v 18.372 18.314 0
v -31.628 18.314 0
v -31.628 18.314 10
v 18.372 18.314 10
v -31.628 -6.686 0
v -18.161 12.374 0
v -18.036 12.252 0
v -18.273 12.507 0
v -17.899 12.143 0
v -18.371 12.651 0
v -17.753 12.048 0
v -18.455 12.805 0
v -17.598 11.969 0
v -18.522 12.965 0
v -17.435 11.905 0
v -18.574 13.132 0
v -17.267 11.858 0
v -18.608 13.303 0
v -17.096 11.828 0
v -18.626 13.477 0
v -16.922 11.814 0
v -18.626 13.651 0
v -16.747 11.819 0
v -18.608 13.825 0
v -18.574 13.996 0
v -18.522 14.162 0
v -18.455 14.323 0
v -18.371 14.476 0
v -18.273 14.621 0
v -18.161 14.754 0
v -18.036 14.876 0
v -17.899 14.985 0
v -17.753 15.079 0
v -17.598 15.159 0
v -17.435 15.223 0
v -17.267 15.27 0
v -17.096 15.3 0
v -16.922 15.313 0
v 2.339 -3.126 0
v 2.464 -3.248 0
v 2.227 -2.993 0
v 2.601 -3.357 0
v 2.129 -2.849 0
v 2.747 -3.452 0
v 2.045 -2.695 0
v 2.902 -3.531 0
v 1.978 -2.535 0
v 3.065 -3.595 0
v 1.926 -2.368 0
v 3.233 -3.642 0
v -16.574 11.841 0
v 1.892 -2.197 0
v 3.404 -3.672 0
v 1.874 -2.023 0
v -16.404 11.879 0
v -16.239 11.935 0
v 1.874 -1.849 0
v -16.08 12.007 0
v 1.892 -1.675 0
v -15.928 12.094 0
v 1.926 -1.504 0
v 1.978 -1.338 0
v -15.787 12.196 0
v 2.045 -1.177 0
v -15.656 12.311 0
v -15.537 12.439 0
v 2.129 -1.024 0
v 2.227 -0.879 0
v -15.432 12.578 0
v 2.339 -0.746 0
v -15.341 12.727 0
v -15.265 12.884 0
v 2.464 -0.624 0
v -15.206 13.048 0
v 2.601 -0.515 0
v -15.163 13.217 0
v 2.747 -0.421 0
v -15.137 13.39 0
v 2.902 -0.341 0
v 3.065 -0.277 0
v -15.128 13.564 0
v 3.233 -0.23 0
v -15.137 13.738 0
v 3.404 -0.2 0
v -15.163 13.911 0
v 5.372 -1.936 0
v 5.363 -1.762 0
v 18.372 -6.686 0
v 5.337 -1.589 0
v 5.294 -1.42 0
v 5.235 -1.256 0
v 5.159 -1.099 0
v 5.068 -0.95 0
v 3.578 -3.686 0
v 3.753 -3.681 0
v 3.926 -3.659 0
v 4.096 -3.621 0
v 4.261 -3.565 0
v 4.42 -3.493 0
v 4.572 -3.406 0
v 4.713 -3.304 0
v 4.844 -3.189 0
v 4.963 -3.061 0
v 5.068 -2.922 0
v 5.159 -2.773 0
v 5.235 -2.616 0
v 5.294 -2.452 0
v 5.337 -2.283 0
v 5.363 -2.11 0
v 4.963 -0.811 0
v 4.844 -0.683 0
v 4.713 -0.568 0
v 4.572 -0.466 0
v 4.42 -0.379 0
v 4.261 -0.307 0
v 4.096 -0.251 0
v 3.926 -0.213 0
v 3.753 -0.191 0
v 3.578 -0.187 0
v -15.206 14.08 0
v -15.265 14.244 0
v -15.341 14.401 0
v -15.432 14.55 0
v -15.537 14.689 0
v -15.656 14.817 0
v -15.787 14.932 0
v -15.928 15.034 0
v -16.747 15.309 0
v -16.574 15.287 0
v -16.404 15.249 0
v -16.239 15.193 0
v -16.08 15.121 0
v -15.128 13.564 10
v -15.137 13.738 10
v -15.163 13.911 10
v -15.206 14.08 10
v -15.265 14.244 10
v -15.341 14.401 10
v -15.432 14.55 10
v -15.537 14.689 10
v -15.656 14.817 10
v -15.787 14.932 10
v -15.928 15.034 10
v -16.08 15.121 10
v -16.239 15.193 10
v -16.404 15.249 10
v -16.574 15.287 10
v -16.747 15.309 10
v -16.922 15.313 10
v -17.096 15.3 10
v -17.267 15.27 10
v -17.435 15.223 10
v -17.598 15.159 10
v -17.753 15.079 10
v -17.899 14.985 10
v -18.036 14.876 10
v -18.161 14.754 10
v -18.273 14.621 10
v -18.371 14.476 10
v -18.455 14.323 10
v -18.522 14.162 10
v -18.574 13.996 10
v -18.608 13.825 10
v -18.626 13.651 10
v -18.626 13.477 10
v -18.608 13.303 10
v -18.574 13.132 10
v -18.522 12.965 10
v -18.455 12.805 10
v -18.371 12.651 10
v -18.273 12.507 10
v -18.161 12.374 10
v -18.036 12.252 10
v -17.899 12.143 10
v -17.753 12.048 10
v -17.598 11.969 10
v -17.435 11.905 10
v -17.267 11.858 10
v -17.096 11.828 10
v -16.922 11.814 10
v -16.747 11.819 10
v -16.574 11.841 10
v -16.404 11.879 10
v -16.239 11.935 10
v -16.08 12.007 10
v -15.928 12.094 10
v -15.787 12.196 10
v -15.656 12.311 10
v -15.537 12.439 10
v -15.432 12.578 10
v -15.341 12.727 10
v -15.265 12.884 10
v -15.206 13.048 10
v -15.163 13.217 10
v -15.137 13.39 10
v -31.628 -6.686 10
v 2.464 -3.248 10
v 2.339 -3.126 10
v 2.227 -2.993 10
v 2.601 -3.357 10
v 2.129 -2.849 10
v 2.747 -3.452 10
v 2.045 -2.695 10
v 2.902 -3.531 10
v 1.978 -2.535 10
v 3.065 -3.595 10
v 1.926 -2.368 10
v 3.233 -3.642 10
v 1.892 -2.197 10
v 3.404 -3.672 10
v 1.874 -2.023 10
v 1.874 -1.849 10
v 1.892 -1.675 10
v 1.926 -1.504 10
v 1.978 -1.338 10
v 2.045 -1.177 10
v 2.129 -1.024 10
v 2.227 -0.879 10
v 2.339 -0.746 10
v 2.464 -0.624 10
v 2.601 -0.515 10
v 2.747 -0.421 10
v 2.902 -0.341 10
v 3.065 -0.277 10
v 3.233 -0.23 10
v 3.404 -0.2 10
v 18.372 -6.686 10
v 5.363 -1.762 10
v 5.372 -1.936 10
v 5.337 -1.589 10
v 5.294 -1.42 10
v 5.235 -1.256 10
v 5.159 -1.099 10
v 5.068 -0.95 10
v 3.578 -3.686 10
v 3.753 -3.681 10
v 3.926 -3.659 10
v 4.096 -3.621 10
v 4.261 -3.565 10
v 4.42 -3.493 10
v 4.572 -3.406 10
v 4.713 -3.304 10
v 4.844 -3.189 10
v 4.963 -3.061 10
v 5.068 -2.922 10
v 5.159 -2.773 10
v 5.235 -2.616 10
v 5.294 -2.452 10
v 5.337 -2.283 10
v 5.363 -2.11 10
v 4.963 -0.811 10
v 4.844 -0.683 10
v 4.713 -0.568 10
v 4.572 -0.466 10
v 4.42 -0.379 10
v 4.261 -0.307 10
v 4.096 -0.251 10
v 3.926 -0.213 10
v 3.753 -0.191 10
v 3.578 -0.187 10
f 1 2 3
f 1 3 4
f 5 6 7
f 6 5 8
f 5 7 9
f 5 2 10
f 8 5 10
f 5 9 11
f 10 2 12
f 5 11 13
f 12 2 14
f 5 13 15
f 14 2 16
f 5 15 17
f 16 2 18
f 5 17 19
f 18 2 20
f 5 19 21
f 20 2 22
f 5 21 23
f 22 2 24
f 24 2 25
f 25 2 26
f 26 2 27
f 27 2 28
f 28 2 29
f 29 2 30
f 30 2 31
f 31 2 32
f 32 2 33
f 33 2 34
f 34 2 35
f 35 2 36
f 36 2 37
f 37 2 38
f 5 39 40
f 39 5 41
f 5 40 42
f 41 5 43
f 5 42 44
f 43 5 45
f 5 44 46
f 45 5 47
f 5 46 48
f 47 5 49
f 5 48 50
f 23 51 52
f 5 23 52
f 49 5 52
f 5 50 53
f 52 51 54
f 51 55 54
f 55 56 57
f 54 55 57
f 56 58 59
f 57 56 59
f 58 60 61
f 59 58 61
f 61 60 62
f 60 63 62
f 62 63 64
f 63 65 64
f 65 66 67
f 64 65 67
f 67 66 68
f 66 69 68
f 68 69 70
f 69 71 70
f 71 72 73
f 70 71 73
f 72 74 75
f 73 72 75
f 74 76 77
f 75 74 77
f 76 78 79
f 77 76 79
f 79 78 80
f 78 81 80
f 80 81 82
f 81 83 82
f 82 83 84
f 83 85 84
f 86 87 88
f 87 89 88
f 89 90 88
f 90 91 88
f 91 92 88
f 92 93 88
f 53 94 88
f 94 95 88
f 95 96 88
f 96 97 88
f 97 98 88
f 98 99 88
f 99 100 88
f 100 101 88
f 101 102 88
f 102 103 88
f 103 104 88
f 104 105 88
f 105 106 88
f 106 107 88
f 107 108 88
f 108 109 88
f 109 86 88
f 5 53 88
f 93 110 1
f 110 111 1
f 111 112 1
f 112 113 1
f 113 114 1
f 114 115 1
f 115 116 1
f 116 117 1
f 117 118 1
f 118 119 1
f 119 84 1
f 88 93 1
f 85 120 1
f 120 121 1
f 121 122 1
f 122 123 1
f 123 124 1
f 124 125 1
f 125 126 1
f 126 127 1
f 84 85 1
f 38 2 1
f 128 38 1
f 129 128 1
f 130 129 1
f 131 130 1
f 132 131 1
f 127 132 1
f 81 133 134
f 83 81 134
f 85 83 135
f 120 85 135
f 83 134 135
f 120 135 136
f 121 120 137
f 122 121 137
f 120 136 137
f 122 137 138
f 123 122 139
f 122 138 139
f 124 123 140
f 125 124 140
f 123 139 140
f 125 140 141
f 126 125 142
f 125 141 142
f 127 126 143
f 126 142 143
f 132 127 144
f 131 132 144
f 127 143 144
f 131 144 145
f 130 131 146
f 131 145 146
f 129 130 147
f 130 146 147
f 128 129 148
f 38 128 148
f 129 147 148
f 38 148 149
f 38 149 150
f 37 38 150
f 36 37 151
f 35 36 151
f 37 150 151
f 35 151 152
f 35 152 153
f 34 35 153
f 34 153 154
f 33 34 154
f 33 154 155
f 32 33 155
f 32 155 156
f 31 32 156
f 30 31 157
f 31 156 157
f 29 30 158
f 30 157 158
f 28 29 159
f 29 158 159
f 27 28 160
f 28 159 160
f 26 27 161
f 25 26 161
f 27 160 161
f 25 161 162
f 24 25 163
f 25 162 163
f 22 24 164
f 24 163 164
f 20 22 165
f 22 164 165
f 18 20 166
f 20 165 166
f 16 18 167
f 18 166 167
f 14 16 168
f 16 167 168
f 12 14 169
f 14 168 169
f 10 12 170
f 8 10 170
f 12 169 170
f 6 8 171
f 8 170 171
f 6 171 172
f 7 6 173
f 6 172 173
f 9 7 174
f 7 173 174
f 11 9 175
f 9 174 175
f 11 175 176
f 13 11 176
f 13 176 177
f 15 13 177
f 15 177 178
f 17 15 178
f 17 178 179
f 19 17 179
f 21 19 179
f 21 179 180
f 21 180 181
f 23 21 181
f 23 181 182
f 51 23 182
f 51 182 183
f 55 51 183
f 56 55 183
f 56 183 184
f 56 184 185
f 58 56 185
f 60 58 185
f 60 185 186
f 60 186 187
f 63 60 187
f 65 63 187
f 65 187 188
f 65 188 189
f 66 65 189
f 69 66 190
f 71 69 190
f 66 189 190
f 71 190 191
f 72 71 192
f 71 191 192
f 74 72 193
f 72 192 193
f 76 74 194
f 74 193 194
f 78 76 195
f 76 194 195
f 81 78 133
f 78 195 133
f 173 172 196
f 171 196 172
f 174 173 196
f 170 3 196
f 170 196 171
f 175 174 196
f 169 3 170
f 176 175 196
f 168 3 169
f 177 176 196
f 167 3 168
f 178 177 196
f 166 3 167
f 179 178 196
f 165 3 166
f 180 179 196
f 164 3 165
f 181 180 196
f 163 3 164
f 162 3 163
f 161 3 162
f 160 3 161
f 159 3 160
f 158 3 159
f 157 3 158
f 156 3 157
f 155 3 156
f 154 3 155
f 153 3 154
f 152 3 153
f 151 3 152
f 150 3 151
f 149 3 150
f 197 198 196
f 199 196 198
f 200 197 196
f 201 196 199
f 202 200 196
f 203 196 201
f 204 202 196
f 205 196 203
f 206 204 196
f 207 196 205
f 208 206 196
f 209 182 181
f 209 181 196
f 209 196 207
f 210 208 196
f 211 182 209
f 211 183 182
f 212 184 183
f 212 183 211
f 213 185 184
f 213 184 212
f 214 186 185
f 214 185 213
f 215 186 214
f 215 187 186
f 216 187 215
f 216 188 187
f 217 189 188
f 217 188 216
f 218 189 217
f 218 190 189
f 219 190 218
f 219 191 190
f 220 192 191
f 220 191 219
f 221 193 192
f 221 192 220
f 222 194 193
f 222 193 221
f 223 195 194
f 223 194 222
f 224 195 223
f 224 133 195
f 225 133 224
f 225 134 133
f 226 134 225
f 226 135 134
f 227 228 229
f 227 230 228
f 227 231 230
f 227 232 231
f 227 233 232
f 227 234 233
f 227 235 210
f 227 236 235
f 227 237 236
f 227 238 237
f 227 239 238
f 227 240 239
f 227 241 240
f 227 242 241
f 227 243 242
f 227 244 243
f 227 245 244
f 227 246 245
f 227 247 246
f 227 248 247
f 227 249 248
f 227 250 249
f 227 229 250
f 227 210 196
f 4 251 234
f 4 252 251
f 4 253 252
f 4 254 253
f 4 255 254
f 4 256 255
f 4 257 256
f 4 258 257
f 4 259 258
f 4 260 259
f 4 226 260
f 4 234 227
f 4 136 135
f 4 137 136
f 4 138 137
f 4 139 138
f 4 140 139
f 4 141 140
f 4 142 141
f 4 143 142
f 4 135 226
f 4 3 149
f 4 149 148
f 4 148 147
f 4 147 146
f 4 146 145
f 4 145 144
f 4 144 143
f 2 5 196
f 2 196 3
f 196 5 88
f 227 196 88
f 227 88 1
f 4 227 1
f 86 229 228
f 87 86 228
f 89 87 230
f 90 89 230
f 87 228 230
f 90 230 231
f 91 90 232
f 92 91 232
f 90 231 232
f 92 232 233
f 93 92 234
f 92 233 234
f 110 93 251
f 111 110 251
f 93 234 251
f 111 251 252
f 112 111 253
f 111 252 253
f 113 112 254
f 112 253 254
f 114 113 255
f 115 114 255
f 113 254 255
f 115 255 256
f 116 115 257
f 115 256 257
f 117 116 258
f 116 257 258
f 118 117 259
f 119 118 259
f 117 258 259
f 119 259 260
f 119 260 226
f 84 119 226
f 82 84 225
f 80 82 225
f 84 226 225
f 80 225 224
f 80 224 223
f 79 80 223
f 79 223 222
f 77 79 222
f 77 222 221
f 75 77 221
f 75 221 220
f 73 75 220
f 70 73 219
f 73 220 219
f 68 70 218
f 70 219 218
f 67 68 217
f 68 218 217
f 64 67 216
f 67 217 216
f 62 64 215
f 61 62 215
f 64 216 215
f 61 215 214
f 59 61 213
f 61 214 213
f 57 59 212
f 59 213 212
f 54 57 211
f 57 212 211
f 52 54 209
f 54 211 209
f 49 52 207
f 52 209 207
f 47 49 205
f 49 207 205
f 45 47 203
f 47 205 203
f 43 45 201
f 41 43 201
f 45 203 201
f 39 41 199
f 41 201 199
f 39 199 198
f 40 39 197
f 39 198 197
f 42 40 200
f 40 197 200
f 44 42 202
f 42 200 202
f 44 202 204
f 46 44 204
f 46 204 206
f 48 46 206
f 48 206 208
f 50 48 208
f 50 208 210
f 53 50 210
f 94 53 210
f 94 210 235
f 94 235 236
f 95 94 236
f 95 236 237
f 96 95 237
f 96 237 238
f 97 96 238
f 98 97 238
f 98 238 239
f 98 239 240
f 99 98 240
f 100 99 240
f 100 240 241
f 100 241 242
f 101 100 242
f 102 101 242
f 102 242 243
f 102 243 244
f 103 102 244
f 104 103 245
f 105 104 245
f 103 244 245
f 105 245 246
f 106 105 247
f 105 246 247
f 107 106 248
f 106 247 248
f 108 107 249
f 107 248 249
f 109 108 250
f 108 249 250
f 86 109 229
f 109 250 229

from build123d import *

# Parameters (mm, degrees)
SKETCH1_W           = 50
SKETCH1_H           = 25
BOSS_EXTRUDE1_DEPTH = 10
SKETCH2_R           = 1.75
CUT_EXTRUDE1_DEPTH  = 10
SKETCH3_R           = 1.75
CUT_EXTRUDE2_DEPTH  = 10


with BuildPart() as part:
    # Sketch1 → Boss-Extrude1 (new body)
    with BuildSketch(Plane.XY):
        with Locations((-6.627906977, 5.813953488)):
            Rectangle(SKETCH1_W, SKETCH1_H)
    extrude(amount=BOSS_EXTRUDE1_DEPTH)

    # Sketch2 → Cut-Extrude1 (cut)
    with BuildSketch(Plane.XY.offset(10)):
        with Locations((-16.877906977, 13.563953488)):
            Circle(SKETCH2_R)
    extrude(amount=-CUT_EXTRUDE1_DEPTH, mode=Mode.SUBTRACT)

    # Sketch3 → Cut-Extrude2 (cut)
    with BuildSketch(Plane.XY.offset(10)):
        with Locations((3.622093023, -1.936046512)):
            Circle(SKETCH3_R)
    extrude(amount=-CUT_EXTRUDE2_DEPTH, mode=Mode.SUBTRACT)


solid = part.part
